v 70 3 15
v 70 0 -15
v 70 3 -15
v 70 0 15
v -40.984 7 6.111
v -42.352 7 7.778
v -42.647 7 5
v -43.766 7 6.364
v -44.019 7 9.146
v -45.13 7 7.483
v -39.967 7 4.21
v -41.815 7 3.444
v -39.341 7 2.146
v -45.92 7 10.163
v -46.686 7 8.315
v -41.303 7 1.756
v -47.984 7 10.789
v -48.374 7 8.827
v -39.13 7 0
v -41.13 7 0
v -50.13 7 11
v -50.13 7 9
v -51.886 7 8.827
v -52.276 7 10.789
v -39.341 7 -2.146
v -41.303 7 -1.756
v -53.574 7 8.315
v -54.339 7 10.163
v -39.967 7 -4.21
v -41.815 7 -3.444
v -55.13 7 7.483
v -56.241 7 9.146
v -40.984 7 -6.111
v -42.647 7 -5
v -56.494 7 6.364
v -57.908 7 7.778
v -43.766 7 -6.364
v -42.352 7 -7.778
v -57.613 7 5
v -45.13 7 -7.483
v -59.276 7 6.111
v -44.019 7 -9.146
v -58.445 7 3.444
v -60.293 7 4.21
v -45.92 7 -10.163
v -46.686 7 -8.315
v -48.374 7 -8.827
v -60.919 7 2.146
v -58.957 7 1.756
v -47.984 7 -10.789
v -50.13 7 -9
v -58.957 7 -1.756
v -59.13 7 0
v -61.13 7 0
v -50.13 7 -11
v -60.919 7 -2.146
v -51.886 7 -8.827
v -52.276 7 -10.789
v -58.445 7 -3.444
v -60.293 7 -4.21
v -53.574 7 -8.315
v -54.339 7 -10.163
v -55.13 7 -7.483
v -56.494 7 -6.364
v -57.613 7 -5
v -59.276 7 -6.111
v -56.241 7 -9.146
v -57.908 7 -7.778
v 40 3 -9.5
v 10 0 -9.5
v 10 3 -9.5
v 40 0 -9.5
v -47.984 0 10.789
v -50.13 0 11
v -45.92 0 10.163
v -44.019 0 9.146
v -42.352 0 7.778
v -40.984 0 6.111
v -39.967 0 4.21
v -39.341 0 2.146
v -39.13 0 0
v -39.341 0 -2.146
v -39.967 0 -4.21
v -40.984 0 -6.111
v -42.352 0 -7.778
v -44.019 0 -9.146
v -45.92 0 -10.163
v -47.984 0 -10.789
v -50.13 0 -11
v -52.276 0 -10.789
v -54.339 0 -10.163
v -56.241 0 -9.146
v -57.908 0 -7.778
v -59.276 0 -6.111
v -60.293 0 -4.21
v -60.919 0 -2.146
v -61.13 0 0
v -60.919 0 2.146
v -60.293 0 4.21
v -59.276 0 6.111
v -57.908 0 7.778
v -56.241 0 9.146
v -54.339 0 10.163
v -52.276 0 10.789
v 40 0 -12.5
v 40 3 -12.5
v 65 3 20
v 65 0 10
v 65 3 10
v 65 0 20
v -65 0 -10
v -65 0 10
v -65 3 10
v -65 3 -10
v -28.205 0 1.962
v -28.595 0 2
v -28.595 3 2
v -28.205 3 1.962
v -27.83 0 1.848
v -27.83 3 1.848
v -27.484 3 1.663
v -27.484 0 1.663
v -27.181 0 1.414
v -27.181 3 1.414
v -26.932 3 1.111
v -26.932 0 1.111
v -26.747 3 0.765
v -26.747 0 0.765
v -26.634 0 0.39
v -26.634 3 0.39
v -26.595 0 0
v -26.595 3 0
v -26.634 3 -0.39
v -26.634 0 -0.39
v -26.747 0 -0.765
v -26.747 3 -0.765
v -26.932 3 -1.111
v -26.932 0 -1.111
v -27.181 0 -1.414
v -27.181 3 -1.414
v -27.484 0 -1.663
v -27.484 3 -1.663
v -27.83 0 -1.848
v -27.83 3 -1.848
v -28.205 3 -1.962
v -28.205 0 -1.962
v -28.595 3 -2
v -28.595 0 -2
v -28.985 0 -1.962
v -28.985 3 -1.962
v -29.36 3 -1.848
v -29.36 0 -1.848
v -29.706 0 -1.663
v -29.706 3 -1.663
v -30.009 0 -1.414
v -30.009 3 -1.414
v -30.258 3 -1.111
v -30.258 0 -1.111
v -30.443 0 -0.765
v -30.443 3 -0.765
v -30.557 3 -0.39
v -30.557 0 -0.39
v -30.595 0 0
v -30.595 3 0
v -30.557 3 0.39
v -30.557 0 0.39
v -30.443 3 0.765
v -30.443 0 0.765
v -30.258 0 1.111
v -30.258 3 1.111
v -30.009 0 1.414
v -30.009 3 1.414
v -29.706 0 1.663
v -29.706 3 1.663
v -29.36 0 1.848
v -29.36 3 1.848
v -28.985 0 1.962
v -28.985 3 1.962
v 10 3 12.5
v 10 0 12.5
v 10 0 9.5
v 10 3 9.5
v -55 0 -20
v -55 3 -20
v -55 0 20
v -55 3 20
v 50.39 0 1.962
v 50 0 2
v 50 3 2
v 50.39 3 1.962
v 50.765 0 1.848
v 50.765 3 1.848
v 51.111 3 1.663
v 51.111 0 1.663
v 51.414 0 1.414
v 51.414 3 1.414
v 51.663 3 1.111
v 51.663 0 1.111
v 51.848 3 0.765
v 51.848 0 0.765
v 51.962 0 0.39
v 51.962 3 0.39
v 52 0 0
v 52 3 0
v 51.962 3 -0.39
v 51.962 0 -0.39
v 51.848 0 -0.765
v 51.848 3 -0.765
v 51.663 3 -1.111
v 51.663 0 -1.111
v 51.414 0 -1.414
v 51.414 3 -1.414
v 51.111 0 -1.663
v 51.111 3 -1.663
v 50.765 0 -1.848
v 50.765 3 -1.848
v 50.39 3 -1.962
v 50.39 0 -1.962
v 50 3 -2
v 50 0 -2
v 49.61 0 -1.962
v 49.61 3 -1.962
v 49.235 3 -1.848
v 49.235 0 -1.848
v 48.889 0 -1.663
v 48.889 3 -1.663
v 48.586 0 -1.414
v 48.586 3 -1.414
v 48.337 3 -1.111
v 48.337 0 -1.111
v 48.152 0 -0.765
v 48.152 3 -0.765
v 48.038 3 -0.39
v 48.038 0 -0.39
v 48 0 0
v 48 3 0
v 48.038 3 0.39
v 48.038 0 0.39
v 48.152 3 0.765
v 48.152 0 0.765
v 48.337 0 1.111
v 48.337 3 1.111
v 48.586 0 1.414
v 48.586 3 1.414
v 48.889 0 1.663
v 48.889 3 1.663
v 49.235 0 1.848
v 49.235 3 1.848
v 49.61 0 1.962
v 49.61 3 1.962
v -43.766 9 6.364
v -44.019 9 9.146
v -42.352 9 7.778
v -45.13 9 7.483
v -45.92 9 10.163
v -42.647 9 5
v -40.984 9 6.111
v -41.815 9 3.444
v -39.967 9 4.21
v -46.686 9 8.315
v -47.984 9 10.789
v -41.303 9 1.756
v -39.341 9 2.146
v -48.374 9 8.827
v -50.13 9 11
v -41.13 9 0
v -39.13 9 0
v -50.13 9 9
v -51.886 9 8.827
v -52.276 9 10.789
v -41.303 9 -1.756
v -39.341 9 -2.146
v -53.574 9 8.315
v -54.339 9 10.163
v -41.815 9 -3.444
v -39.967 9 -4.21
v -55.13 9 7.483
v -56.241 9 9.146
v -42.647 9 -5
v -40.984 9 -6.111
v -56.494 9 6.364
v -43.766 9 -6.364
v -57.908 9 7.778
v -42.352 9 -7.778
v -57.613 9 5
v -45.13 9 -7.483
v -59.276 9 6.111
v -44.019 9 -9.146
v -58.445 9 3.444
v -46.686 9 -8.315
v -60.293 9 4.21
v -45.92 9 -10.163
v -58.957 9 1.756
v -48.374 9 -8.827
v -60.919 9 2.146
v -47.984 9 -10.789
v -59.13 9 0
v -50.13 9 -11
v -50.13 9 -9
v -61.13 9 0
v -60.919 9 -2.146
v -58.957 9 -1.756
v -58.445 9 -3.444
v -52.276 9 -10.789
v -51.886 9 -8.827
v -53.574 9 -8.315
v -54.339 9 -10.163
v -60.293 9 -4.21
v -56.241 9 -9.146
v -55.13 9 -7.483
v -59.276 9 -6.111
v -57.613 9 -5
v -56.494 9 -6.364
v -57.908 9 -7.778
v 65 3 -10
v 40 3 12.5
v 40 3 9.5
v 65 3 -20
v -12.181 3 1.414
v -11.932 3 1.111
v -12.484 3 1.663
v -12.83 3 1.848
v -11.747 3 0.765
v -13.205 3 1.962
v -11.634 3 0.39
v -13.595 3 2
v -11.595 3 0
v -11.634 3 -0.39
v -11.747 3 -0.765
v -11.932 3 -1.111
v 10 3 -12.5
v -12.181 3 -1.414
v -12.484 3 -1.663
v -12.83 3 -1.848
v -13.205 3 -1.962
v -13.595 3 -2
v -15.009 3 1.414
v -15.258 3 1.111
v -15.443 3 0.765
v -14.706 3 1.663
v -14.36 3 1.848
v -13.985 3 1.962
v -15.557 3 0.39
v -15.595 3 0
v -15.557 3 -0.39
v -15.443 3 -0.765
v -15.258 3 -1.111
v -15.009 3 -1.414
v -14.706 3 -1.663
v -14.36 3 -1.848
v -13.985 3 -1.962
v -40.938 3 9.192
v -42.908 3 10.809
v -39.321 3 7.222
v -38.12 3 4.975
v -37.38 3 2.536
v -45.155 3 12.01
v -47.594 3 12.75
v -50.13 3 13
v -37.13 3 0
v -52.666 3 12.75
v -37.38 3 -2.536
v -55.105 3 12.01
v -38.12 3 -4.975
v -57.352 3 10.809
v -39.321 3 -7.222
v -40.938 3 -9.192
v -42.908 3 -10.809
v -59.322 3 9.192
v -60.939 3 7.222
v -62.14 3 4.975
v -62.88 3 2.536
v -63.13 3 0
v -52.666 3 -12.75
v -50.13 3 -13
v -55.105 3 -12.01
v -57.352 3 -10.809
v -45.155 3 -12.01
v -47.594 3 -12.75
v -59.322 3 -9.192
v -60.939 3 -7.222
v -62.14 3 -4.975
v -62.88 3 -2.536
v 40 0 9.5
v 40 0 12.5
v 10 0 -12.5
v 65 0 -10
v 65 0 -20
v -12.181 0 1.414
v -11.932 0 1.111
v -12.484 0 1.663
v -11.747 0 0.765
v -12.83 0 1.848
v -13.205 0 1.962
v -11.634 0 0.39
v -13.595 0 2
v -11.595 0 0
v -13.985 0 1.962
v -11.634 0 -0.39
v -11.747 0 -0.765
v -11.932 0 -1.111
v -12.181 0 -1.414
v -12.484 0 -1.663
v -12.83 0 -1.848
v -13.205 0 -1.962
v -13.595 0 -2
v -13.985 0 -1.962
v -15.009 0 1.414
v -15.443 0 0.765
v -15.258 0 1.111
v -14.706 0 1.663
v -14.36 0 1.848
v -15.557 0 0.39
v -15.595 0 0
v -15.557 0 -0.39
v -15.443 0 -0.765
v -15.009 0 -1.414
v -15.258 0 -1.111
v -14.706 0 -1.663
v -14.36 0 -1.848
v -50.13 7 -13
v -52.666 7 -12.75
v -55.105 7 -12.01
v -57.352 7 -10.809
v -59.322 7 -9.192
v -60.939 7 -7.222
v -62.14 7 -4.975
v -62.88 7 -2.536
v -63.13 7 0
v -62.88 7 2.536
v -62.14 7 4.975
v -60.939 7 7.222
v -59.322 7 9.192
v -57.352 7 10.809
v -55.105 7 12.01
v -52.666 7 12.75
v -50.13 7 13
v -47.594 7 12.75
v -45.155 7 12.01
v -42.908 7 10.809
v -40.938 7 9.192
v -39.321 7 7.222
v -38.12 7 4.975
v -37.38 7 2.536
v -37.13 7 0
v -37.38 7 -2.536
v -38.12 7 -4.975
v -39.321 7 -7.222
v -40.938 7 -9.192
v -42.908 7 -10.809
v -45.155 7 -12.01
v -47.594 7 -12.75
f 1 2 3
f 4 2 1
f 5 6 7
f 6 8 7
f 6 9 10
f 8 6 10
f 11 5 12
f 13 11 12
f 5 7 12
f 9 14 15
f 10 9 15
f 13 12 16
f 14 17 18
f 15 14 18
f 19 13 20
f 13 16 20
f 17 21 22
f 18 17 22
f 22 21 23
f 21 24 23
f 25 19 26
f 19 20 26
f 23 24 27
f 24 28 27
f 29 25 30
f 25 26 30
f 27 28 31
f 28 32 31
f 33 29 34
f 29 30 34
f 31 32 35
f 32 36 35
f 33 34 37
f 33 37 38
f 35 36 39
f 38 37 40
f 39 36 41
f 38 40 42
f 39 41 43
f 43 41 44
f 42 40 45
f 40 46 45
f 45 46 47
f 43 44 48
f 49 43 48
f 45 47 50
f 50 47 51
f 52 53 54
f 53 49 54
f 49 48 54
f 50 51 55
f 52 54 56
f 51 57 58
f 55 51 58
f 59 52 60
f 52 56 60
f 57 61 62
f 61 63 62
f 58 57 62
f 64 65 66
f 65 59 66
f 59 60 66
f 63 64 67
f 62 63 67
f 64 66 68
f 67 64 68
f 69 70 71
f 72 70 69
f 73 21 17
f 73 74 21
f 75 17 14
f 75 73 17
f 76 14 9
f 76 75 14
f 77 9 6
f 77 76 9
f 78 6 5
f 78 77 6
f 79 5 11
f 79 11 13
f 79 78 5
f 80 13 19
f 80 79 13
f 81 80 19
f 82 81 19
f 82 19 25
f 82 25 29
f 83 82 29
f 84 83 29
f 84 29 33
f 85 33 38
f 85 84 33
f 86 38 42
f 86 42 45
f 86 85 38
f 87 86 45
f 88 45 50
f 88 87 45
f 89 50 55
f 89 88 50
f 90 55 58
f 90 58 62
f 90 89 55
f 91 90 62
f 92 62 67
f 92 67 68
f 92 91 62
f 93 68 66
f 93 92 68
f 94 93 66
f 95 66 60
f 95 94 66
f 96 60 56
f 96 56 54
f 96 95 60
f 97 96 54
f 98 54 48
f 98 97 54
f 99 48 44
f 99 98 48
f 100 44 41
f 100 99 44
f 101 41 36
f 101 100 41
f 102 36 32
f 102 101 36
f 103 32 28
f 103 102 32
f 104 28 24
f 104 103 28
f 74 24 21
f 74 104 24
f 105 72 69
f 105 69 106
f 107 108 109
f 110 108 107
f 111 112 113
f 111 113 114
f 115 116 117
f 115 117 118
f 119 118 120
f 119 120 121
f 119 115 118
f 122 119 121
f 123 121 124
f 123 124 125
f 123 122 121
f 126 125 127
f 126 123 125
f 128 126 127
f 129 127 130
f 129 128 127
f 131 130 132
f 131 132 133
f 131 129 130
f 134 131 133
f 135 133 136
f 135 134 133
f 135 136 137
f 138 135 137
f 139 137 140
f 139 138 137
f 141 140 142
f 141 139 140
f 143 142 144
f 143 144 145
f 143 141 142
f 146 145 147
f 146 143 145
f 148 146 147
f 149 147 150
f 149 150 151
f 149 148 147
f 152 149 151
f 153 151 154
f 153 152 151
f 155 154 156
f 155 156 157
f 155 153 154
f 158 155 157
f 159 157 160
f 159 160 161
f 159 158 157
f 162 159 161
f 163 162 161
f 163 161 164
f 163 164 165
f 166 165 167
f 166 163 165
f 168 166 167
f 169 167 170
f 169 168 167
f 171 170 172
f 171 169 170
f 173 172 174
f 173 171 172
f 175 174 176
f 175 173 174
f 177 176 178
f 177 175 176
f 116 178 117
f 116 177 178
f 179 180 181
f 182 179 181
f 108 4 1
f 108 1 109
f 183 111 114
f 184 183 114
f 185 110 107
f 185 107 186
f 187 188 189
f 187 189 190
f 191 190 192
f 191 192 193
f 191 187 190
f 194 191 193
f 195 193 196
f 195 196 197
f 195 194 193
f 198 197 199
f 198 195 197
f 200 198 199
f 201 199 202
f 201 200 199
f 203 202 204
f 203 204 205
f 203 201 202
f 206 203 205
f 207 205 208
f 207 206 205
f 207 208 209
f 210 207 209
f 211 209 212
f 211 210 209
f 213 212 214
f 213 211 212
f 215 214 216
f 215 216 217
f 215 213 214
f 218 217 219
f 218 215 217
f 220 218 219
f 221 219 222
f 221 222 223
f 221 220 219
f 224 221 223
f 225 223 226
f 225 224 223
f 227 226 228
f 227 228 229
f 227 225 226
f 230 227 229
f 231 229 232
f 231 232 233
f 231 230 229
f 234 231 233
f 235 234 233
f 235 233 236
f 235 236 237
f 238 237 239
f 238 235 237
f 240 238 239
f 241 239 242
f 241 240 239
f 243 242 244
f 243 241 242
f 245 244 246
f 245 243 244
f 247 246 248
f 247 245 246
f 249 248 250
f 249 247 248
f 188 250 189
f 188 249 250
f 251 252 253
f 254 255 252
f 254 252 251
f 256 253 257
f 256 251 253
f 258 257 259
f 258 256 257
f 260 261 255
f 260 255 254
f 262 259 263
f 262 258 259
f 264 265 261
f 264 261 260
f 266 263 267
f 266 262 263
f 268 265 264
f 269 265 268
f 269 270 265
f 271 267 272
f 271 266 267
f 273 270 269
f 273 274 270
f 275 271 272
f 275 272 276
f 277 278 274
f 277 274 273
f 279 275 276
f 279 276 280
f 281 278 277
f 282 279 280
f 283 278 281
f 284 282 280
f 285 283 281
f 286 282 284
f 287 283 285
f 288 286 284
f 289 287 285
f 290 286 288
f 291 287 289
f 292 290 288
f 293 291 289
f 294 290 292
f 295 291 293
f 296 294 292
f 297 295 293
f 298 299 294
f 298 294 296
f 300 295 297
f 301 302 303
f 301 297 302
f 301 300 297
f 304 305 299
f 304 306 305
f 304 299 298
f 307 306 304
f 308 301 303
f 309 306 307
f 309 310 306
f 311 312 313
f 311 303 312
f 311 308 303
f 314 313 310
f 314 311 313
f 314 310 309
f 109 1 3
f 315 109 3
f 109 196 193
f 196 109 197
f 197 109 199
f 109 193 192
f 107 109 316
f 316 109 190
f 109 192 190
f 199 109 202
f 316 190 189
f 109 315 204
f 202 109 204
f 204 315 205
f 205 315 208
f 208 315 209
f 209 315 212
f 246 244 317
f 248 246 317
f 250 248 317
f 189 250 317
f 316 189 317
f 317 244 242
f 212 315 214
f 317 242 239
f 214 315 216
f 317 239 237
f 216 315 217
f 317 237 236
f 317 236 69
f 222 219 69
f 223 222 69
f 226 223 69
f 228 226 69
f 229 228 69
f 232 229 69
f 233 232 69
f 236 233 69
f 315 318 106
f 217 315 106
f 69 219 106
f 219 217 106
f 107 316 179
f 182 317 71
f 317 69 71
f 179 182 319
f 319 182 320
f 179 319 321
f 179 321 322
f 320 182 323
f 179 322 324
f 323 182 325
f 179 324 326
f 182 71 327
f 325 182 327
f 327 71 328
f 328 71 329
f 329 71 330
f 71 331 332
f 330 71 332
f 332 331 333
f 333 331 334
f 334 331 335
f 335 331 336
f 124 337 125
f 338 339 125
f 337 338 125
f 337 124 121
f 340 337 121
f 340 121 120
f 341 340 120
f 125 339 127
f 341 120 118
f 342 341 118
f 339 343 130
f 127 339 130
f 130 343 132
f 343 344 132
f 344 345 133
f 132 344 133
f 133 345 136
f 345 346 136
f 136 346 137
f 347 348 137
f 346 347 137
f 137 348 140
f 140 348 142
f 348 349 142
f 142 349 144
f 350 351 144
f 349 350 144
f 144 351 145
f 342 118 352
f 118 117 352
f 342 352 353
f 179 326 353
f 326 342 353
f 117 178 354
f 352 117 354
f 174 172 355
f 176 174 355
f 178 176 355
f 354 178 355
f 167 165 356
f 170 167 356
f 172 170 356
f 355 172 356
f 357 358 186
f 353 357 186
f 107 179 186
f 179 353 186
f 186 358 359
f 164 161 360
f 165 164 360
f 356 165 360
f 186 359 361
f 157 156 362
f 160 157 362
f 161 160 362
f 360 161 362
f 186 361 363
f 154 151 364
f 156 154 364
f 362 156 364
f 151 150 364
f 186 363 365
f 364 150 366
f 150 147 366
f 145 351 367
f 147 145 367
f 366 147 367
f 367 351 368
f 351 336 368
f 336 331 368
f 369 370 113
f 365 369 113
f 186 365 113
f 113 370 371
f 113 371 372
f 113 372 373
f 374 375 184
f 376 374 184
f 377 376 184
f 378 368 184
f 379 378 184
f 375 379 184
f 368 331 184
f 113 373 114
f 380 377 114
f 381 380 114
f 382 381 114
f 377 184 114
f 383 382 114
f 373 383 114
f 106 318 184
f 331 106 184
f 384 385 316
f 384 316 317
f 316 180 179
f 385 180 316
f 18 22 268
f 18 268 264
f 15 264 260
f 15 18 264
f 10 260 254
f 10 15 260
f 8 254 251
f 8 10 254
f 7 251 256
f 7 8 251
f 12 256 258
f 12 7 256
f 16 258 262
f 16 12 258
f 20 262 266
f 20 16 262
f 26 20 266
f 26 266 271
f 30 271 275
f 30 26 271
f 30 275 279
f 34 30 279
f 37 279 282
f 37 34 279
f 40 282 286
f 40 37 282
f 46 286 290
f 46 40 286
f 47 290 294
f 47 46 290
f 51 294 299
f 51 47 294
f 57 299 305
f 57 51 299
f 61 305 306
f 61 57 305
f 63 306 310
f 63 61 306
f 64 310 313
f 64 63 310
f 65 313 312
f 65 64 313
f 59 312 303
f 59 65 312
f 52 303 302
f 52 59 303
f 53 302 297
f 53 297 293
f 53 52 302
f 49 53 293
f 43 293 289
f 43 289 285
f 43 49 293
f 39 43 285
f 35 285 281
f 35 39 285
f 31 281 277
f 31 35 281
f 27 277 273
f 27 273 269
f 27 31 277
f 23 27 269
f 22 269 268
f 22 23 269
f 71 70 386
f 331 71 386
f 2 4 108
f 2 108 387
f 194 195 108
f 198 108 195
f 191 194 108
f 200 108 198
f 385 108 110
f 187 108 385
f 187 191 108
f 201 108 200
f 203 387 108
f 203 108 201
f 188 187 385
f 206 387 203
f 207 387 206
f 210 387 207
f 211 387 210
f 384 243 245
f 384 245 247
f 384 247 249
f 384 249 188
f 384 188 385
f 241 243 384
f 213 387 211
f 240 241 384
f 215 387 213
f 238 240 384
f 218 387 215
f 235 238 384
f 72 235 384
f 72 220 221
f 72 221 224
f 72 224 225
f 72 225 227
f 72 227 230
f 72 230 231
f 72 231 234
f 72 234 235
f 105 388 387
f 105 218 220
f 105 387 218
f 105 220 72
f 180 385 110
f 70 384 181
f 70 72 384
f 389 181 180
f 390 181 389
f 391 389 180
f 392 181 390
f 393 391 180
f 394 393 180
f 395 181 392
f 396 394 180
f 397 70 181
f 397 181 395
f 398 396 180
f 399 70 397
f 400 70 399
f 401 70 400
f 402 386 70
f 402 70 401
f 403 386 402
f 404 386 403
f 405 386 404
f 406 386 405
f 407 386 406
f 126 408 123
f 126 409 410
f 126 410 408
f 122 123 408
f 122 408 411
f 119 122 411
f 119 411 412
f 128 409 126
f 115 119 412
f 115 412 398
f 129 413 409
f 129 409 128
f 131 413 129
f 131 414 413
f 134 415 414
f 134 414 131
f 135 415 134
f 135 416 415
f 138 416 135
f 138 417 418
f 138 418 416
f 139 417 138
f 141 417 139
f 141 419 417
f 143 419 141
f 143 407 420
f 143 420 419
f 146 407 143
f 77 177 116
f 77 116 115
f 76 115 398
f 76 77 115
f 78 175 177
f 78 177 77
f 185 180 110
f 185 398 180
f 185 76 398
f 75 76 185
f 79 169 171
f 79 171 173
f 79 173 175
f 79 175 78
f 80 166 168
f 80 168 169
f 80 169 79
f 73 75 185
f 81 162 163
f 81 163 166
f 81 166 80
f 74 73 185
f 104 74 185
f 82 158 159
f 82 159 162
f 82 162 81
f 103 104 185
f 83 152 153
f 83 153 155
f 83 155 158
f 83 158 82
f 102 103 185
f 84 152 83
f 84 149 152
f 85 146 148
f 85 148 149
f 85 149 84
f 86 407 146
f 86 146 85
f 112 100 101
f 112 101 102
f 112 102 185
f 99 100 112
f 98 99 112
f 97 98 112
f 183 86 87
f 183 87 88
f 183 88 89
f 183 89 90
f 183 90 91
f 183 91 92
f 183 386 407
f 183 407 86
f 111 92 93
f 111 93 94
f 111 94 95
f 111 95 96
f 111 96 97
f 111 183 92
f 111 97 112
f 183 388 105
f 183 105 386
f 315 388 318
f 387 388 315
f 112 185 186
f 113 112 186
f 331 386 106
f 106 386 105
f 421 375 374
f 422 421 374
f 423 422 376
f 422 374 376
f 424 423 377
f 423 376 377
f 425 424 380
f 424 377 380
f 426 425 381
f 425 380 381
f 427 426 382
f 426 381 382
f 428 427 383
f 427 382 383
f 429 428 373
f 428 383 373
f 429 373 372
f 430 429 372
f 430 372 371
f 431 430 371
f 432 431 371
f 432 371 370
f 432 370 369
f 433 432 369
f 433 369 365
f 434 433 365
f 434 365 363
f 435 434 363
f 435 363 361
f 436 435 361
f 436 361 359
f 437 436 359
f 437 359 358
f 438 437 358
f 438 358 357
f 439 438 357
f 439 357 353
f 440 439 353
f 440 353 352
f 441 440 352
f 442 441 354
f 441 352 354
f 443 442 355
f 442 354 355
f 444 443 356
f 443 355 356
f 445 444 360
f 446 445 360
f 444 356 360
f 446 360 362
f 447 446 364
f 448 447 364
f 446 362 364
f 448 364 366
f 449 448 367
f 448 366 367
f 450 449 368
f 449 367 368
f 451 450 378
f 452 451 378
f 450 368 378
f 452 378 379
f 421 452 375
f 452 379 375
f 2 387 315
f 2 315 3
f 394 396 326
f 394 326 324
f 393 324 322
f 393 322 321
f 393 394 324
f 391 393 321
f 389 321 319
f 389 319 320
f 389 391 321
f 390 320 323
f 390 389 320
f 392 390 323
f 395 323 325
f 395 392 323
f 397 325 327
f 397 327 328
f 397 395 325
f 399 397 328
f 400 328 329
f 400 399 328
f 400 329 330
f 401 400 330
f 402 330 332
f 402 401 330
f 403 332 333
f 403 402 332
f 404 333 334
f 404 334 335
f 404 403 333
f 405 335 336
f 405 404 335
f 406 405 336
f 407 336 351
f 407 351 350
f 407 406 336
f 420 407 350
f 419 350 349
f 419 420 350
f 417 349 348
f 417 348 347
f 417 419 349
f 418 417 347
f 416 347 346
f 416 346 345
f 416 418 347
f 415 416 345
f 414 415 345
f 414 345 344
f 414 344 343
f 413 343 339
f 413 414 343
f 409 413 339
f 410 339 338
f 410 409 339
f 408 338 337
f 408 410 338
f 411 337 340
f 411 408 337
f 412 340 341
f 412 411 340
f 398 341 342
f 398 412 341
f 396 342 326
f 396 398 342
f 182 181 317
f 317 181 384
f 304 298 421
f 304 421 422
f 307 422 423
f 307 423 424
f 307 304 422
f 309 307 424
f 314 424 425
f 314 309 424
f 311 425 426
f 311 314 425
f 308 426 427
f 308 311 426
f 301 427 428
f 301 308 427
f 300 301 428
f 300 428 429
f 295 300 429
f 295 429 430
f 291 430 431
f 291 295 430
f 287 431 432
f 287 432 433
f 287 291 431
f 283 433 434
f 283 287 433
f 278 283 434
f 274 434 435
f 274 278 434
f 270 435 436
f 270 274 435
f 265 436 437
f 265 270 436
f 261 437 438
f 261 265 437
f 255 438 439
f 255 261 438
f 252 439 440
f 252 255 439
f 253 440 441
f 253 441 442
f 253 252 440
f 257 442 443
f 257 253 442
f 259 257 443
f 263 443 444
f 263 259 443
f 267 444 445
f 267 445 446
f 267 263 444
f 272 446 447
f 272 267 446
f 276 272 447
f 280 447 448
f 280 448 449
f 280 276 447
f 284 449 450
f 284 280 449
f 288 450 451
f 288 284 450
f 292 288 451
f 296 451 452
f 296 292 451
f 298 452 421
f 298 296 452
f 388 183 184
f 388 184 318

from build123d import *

# Parameters (mm, degrees)
CROQUIS1_R              = 11
CROQUIS1_R_2            = 2
CROQUIS1_W              = 30
CROQUIS1_H              = 3
SALIENTE_EXTRUIR1_DEPTH = 3
CROQUIS2_R              = 13
CROQUIS2_R_2            = 11
SALIENTE_EXTRUIR2_DEPTH = 4
CROQUIS3_R              = 13
CROQUIS3_R_2            = 9
SALIENTE_EXTRUIR3_DEPTH = 2
CHAFL_N1_SIZE           = 2
CHAFL_N2_SIZE           = 10


with BuildPart() as part:
    # Croquis1 → Saliente-Extruir1 (new body)
    with BuildSketch(Plane(origin=(0, 0, 0), x_dir=(1, 0, 0), z_dir=(0, 1, 0))):
        Polygon((65, 10), (70, 15), (70, -15), (65, -10), (65, -20), (-65, -20), (-65, 20), (65, 20), align=None)
        with Locations(Location((-50.129942902, 0, 0), (0, 0, 270))):
            Circle(CROQUIS1_R, mode=Mode.SUBTRACT)
        with Locations(Location((-28.595127909, 0, 0), (0, 0, 270))):
            Circle(CROQUIS1_R_2, mode=Mode.SUBTRACT)
        with Locations(Location((-13.595127909, 0, 0), (0, 0, 270))):
            Circle(CROQUIS1_R_2, mode=Mode.SUBTRACT)
        with Locations(Location((50, 0, 0), (0, 0, 270))):
            Circle(CROQUIS1_R_2, mode=Mode.SUBTRACT)
        with Locations((25, 11)):
            Rectangle(CROQUIS1_W, CROQUIS1_H, mode=Mode.SUBTRACT)
        with Locations((25, -11)):
            Rectangle(CROQUIS1_W, CROQUIS1_H, mode=Mode.SUBTRACT)
    extrude(amount=SALIENTE_EXTRUIR1_DEPTH)

    # Croquis2 → Saliente-Extruir2 (add)
    with BuildSketch(Plane(origin=(0, 3, 0), x_dir=(1, 0, 0), z_dir=(0, 1, 0))):
        with Locations(Location((-50.129942902, 0, 0), (0, 0, 90))):
            Circle(CROQUIS2_R)
        with Locations(Location((-50.129942902, 0, 0), (0, 0, 270))):
            Circle(CROQUIS2_R_2, mode=Mode.SUBTRACT)
    extrude(amount=SALIENTE_EXTRUIR2_DEPTH)

    # Croquis3 → Saliente-Extruir3 (add)
    with BuildSketch(Plane(origin=(0, 7, 0), x_dir=(1, 0, 0), z_dir=(0, 1, 0))):
        with Locations(Location((-50.129942902, 0, 0), (0, 0, 90))):
            Circle(CROQUIS3_R)
        with Locations(Location((-50.129942902, 0, 0), (0, 0, 270))):
            Circle(CROQUIS3_R_2, mode=Mode.SUBTRACT)
    extrude(amount=SALIENTE_EXTRUIR3_DEPTH)

    # Chaflán1
    chafl_n1_edges = [part.edges().sort_by_distance(p)[0] for p in [
        (-50.129942902, 9, 13),
    ]]
    chamfer(chafl_n1_edges, length=CHAFL_N1_SIZE)

    # Chaflán2
    chafl_n2_edges = [part.edges().sort_by_distance(p)[0] for p in [
        (-65, 1.5, 20),
        (-65, 1.5, -20),
    ]]
    chamfer(chafl_n2_edges, length=CHAFL_N2_SIZE)


solid = part.part
